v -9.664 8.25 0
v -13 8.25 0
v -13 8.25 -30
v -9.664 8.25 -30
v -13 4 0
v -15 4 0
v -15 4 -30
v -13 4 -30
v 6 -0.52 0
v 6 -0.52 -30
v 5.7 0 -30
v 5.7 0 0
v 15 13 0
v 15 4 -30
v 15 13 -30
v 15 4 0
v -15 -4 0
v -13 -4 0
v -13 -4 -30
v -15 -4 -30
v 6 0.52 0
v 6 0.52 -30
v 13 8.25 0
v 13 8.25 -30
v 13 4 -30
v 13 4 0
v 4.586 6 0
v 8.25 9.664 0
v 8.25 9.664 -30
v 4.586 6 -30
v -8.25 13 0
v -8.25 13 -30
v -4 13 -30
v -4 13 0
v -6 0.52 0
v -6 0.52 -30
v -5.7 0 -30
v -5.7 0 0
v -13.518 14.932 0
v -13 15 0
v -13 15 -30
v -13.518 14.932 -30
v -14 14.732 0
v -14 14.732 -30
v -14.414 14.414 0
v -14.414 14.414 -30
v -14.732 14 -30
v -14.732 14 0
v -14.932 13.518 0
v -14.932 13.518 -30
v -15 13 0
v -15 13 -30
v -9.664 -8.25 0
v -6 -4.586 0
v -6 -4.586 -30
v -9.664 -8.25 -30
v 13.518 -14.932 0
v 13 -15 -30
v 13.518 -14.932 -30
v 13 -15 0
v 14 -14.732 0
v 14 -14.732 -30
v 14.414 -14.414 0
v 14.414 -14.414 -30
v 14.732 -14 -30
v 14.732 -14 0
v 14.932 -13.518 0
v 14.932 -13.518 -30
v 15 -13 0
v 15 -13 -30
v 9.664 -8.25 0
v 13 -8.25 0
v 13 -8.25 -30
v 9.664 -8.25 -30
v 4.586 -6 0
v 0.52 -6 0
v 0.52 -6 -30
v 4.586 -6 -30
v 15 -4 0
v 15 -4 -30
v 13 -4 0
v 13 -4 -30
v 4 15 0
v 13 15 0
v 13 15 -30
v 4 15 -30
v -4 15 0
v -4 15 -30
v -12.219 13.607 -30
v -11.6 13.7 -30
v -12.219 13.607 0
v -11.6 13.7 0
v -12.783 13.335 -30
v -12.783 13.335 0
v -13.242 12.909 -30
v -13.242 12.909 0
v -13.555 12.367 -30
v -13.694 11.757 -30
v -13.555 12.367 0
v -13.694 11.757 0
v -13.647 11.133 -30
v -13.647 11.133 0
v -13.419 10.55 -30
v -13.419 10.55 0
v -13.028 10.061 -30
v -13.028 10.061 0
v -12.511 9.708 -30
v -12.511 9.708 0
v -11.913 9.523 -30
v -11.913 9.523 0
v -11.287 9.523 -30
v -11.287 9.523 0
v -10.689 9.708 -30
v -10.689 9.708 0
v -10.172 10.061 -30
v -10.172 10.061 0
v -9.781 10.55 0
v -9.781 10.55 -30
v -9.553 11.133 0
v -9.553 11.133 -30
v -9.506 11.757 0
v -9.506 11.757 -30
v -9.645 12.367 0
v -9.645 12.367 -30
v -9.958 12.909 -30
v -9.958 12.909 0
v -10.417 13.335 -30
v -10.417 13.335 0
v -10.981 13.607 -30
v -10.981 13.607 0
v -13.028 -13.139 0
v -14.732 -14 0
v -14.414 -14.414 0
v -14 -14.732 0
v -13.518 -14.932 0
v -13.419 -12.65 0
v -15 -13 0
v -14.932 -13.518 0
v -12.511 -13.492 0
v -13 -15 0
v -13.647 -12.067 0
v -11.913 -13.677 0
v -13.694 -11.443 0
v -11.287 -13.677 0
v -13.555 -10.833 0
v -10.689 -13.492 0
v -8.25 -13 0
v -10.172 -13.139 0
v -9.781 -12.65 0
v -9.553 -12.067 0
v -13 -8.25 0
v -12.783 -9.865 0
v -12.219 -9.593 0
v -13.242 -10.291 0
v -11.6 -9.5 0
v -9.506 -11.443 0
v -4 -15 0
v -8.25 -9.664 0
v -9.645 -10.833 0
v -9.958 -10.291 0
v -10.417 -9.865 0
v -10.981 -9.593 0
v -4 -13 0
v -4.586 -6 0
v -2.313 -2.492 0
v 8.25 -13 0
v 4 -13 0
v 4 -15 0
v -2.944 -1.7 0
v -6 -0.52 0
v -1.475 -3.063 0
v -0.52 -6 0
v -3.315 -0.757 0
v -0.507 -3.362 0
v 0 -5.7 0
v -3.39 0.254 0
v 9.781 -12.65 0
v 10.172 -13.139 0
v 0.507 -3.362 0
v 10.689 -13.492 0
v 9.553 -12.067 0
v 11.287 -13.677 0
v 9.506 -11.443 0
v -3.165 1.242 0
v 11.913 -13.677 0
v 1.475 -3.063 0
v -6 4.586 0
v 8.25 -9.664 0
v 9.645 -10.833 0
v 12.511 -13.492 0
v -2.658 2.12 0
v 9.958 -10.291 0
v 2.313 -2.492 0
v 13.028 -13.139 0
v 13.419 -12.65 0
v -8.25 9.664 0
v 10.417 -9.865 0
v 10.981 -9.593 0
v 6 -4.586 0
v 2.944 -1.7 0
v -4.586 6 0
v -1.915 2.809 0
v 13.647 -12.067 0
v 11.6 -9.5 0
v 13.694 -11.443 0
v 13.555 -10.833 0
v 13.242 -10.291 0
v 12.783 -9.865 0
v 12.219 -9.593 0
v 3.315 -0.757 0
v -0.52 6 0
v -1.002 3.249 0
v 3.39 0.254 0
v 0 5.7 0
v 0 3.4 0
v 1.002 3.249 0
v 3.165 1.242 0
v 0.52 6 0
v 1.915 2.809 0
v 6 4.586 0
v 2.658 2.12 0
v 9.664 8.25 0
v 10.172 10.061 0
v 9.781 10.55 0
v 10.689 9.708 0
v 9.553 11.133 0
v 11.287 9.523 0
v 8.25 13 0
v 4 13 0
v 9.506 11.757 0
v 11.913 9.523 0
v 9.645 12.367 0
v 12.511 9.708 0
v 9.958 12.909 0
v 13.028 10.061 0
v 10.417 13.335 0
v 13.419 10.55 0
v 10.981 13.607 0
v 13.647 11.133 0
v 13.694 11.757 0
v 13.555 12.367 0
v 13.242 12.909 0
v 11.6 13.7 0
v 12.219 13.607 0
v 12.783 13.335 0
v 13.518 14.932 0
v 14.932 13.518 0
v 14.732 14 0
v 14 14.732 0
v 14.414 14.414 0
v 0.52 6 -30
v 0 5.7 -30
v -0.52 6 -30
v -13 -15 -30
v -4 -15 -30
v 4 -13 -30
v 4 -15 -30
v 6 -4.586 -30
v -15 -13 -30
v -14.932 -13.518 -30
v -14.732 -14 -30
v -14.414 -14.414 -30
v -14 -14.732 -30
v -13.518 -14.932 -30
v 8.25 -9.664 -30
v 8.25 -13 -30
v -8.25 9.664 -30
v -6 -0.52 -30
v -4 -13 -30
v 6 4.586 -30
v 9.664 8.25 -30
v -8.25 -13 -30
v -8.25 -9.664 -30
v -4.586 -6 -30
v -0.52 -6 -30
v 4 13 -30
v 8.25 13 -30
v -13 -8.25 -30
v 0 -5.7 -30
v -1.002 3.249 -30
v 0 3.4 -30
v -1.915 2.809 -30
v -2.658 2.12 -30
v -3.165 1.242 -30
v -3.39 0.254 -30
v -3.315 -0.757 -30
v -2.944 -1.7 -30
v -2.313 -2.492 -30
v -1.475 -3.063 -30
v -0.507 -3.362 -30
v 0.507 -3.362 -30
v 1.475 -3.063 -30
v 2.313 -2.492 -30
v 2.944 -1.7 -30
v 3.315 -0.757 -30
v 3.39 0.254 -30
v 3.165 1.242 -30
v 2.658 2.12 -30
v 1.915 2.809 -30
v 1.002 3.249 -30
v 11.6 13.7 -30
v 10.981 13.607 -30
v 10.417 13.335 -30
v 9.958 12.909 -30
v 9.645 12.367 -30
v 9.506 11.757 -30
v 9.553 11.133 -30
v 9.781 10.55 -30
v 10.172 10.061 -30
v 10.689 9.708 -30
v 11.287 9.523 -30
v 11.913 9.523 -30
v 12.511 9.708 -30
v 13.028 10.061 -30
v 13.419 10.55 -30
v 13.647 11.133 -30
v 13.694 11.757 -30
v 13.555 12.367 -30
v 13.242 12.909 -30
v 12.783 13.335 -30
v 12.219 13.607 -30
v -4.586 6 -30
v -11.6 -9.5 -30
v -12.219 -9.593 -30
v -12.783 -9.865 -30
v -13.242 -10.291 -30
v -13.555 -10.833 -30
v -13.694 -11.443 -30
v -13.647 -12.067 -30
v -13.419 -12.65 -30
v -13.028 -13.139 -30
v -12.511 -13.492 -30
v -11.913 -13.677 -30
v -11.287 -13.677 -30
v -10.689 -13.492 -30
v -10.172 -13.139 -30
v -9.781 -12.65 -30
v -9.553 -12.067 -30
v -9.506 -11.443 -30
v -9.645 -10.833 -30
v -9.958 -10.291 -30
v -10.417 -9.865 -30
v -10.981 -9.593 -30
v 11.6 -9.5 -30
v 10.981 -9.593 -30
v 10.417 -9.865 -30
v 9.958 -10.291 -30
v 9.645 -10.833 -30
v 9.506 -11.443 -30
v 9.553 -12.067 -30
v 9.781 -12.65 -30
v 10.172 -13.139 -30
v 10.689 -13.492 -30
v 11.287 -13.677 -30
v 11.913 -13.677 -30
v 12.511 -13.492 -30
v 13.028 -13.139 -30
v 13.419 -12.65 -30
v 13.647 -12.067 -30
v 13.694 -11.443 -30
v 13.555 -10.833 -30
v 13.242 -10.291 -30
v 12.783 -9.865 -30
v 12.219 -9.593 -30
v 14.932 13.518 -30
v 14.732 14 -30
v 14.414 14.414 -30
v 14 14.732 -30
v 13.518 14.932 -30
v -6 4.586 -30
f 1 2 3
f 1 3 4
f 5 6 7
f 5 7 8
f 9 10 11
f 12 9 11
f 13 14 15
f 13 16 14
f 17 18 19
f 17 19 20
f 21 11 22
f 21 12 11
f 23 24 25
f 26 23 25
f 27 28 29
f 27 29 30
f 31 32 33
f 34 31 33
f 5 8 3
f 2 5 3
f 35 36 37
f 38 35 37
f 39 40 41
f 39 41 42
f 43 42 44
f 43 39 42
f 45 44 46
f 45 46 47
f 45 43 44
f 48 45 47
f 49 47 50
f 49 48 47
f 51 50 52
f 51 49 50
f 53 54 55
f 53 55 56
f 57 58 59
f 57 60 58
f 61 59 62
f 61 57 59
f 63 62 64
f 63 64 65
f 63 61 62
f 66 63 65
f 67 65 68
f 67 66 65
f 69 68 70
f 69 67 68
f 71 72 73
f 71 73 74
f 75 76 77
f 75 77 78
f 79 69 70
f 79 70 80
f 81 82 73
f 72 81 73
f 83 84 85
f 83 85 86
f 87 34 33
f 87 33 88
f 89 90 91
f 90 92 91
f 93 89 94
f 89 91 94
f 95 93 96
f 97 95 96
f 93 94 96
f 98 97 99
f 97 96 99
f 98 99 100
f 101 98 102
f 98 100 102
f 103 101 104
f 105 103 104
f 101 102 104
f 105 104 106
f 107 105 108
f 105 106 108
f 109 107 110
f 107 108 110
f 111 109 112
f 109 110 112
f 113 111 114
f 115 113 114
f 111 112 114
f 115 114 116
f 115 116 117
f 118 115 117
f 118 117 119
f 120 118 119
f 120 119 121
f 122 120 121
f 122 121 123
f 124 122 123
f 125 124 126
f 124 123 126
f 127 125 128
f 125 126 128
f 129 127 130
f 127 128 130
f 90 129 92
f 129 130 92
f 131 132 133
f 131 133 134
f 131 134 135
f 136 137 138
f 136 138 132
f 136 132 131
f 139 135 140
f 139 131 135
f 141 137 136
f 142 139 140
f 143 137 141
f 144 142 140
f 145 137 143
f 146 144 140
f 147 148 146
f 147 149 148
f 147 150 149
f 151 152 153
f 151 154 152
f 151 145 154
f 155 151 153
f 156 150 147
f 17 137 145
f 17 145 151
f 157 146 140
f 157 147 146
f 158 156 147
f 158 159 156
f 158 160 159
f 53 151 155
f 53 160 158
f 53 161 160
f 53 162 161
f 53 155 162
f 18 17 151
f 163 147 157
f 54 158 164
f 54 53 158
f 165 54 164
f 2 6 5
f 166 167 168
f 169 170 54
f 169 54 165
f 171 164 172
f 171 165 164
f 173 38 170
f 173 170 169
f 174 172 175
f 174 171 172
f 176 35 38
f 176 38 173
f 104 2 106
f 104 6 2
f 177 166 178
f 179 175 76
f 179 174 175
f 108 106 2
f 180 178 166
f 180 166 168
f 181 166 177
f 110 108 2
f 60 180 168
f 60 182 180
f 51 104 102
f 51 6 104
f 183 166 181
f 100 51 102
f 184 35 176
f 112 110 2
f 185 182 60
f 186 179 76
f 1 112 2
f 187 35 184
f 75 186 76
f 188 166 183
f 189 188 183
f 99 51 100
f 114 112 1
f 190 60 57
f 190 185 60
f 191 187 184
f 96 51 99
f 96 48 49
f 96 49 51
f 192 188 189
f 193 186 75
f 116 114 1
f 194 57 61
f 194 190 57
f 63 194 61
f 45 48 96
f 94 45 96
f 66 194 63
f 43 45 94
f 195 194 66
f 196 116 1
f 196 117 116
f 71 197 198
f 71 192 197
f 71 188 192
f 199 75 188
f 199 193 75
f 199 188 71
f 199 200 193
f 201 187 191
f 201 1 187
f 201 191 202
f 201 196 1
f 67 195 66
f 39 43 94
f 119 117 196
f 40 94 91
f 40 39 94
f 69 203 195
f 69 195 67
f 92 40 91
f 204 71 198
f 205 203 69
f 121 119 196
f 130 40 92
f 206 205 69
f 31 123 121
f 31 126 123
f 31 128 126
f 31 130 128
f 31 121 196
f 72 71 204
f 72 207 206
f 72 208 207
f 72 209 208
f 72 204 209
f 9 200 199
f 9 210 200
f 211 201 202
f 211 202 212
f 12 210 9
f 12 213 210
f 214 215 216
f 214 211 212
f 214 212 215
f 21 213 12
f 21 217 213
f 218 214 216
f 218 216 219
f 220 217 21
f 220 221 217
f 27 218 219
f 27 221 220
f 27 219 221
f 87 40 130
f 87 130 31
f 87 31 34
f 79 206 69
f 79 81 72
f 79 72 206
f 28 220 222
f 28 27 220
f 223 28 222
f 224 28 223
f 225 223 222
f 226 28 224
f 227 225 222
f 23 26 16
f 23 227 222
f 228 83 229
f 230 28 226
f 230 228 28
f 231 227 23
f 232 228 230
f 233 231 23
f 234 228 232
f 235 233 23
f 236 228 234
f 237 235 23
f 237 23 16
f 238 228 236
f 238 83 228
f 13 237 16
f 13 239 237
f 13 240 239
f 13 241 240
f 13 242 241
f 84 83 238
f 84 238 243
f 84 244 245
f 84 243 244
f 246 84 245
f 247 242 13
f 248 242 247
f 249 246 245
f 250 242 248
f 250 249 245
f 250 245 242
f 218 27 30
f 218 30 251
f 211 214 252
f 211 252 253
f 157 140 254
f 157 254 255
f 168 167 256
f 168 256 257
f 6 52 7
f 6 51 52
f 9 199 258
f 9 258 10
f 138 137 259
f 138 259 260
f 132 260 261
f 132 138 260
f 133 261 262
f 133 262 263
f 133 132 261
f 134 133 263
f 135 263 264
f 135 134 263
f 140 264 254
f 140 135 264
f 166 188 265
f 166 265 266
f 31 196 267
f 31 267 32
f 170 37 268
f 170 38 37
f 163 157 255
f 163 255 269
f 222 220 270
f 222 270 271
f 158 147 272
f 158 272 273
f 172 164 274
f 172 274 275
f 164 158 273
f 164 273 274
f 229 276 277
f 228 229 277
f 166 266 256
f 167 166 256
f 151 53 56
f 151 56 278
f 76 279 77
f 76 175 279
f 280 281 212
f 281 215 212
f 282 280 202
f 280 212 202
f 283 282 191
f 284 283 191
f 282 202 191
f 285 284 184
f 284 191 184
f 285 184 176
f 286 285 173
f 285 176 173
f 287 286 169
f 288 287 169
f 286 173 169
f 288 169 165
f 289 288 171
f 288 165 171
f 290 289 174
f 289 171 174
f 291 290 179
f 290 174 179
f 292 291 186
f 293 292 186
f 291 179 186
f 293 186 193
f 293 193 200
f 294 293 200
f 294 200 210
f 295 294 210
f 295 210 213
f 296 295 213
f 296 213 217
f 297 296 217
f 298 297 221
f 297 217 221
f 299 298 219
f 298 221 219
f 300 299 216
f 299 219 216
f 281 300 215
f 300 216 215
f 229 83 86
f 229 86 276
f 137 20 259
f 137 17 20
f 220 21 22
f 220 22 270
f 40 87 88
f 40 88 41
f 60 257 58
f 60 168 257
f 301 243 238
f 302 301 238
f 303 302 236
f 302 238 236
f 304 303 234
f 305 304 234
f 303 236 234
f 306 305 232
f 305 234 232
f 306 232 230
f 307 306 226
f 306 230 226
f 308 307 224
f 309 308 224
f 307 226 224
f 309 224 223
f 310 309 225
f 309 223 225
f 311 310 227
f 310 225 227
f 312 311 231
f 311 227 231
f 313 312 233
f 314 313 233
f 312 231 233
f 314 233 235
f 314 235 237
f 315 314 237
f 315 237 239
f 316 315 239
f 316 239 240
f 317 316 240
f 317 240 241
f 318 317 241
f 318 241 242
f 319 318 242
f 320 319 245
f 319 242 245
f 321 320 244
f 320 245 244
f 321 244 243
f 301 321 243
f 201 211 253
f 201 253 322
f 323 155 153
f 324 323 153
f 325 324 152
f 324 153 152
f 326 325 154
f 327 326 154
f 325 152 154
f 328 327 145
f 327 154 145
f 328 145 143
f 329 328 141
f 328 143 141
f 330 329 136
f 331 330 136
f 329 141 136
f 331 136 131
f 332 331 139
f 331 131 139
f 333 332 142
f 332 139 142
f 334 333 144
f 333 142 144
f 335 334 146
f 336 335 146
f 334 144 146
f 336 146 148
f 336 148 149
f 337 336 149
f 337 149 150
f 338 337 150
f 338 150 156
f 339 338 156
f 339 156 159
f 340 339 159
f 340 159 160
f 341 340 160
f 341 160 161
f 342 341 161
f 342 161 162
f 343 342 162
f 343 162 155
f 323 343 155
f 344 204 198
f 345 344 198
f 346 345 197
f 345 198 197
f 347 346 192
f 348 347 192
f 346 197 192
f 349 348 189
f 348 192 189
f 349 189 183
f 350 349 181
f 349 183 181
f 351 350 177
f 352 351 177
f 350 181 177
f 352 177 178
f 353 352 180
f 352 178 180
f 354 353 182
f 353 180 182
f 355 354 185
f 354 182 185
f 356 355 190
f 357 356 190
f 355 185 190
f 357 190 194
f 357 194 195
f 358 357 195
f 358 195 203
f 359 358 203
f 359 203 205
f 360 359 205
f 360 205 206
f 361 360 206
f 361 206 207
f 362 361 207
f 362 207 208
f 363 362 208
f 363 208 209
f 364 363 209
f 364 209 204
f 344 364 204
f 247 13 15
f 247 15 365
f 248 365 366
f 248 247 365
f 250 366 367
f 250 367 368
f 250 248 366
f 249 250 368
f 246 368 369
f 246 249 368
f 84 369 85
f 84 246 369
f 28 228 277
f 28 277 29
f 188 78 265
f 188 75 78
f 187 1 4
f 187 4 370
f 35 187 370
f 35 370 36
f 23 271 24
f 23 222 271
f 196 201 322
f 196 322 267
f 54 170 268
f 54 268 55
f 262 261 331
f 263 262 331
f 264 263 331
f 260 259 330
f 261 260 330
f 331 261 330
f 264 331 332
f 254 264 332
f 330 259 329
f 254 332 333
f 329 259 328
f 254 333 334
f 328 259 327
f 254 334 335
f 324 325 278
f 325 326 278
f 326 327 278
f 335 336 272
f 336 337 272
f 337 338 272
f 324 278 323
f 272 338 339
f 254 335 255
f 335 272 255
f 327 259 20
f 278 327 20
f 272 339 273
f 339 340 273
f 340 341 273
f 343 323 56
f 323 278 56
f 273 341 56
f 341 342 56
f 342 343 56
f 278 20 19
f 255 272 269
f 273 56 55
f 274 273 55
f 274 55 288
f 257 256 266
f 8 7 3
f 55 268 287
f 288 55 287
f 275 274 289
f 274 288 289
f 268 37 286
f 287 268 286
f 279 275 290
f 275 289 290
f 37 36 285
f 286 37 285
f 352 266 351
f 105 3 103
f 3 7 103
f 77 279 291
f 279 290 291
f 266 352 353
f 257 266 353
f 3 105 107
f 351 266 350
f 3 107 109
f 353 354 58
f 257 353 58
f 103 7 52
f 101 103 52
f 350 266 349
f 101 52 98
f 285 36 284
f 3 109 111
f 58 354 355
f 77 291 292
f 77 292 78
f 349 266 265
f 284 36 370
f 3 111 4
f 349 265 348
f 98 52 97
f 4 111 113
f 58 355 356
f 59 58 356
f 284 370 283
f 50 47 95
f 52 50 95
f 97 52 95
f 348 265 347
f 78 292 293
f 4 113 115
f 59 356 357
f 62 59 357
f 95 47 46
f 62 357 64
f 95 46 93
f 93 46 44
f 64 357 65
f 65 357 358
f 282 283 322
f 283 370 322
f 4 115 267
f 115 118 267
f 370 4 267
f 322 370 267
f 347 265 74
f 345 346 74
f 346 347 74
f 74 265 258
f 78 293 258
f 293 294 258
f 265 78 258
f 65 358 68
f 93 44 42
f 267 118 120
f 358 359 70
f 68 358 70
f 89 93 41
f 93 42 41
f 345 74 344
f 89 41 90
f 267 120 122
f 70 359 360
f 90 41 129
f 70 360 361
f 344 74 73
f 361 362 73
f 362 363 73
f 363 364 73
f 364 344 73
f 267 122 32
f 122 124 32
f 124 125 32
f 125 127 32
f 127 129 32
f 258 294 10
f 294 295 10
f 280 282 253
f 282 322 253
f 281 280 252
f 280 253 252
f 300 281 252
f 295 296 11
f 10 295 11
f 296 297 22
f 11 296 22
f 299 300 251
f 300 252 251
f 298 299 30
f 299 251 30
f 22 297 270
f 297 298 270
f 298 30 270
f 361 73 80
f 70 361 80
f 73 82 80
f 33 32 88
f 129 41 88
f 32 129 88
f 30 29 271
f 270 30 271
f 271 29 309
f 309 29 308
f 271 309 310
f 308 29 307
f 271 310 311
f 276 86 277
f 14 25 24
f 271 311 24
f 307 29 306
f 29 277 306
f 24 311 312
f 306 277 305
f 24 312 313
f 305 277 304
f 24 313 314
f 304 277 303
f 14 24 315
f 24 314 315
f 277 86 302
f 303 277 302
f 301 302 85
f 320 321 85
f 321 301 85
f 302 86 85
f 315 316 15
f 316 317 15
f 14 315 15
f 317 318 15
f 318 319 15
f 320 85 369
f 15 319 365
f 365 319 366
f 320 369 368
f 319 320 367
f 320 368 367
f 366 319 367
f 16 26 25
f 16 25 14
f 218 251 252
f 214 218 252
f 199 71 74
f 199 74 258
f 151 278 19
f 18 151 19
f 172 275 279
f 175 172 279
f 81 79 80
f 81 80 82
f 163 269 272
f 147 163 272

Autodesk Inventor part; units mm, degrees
sketch "Sketch_1" plane through (0, 0, 0) normal (0, 0, 1) x (1, 0, 0)
  line L0 (-15, 4) -> (-13, 4)
  line L1 (-13, 4) -> (-13, 8.25)
  line L2 (-13, 8.25) -> (-9.6642, 8.25)
  line L3 (-9.6642, 8.25) -> (-6, 4.5858)
  line L4 (-6, 4.5858) -> (-6, 0.5196)
  line L5 (-6, 0.5196) -> (-5.7, 0)
  line L6 (-5.7, 0) -> (-6, -0.5196)
  line L7 (-6, -0.5196) -> (-6, -4.5858)
  line L8 (-6, -4.5858) -> (-9.6642, -8.25)
  line L9 (-9.6642, -8.25) -> (-13, -8.25)
  line L10 (-13, -8.25) -> (-13, -4)
  line L11 (-13, -4) -> (-15, -4)
  line L12 (-15, -4) -> (-15, -13)
  arc A0 (-15, -13) -> (-13, -15) centre (-13, -13) ccw
  line L13 (-13, -15) -> (-4, -15)
  line L14 (-4, -15) -> (-4, -13)
  line L15 (-4, -13) -> (-8.25, -13)
  line L16 (-8.25, -13) -> (-8.25, -9.6642)
  line L17 (-8.25, -9.6642) -> (-4.5858, -6)
  line L18 (-4.5858, -6) -> (-0.5196, -6)
  line L19 (-0.5196, -6) -> (0, -5.7)
  line L20 (0, -5.7) -> (0.5196, -6)
  line L21 (0.5196, -6) -> (4.5858, -6)
  line L22 (4.5858, -6) -> (8.25, -9.6642)
  line L23 (8.25, -9.6642) -> (8.25, -13)
  line L24 (8.25, -13) -> (4, -13)
  line L25 (4, -13) -> (4, -15)
  line L26 (4, -15) -> (13, -15)
  arc A1 (13, -15) -> (15, -13) centre (13, -13) ccw
  line L27 (15, -13) -> (15, -4)
  line L28 (15, -4) -> (13, -4)
  line L29 (13, -4) -> (13, -8.25)
  line L30 (13, -8.25) -> (9.6642, -8.25)
  line L31 (9.6642, -8.25) -> (6, -4.5858)
  line L32 (6, -4.5858) -> (6, -0.5196)
  line L33 (6, -0.5196) -> (5.7, 0)
  line L34 (5.7, 0) -> (6, 0.5196)
  line L35 (6, 0.5196) -> (6, 4.5858)
  line L36 (6, 4.5858) -> (9.6642, 8.25)
  line L37 (9.6642, 8.25) -> (13, 8.25)
  line L38 (13, 8.25) -> (13, 4)
  line L39 (13, 4) -> (15, 4)
  line L40 (15, 4) -> (15, 13)
  arc A2 (15, 13) -> (13, 15) centre (13, 13) ccw
  line L41 (13, 15) -> (4, 15)
  line L42 (4, 15) -> (4, 13)
  line L43 (4, 13) -> (8.25, 13)
  line L44 (8.25, 13) -> (8.25, 9.6642)
  line L45 (8.25, 9.6642) -> (4.5858, 6)
  line L46 (4.5858, 6) -> (0.5196, 6)
  line L47 (0.5196, 6) -> (0, 5.7)
  line L48 (0, 5.7) -> (-0.5196, 6)
  line L49 (-0.5196, 6) -> (-4.5858, 6)
  line L50 (-4.5858, 6) -> (-8.25, 9.6642)
  line L51 (-8.25, 9.6642) -> (-8.25, 13)
  line L52 (-8.25, 13) -> (-4, 13)
  line L53 (-4, 13) -> (-4, 15)
  line L54 (-4, 15) -> (-13, 15)
  arc A3 (-13, 15) -> (-15, 13) centre (-13, 13) ccw
  line L55 (-15, 13) -> (-15, 4)
extrude "Extrusion1" add sketch "Sketch_1" against normal blind 30
sketch "Sketch2" plane through (0, 0, -30) normal (0, 0, -1) x (-1, 0, 0)
  point P0 (0, 0)
hole "Hole1" at (0, 0, -30) direction (0, 0, 1) diameter 6.8 depth 140
sketch "Sketch3" plane through (0, 0, -30) normal (0, 0, -1) x (-1, 0, 0)
  point P0 (-11.6, 11.6)
hole "Hole2" at (11.6, 11.6, -30) direction (0, 0, 1) diameter 4.2 depth 140
pattern_linear "Rectangular Pattern1" count 2 spacing 23.2 along (-1, 0, 0) count 2 spacing 23.2 along (0, -1, 0) of "Hole2"
ref_plane "C1_XY" through (0, 0, 0) normal (0, 0, 1) x (1, 0, 0)
ref_plane "C1_YZ" through (0, 0, 0) normal (1, 0, 0) x (0, 1, 0)
ref_plane "C1_ZX" through (0, 0, 0) normal (0, 1, 0) x (0, 0, 1)
ref_plane "to_frame_cap1_XY" through (0, 0, 0) normal (0, 0, 1) x (1, 0, 0)
ref_plane "to_frame_cap1_YZ" through (0, 0, 0) normal (1, 0, 0) x (0, 1, 0)
ref_plane "to_frame_cap1_ZX" through (0, 0, 0) normal (0, 1, 0) x (0, 0, 1)
ref_plane "to_frame_cap2_XY" through (0, 0, -140) normal (0, 0, -1) x (1, 0, 0)
ref_plane "to_frame_cap2_YZ" through (0, 0, -140) normal (1, 0, 0) x (0, -1, 0)
ref_plane "to_frame_cap2_ZX" through (0, 0, -140) normal (0, -1, 0) x (0, 0, -1)
properties part number "HFS6-3030-30"
